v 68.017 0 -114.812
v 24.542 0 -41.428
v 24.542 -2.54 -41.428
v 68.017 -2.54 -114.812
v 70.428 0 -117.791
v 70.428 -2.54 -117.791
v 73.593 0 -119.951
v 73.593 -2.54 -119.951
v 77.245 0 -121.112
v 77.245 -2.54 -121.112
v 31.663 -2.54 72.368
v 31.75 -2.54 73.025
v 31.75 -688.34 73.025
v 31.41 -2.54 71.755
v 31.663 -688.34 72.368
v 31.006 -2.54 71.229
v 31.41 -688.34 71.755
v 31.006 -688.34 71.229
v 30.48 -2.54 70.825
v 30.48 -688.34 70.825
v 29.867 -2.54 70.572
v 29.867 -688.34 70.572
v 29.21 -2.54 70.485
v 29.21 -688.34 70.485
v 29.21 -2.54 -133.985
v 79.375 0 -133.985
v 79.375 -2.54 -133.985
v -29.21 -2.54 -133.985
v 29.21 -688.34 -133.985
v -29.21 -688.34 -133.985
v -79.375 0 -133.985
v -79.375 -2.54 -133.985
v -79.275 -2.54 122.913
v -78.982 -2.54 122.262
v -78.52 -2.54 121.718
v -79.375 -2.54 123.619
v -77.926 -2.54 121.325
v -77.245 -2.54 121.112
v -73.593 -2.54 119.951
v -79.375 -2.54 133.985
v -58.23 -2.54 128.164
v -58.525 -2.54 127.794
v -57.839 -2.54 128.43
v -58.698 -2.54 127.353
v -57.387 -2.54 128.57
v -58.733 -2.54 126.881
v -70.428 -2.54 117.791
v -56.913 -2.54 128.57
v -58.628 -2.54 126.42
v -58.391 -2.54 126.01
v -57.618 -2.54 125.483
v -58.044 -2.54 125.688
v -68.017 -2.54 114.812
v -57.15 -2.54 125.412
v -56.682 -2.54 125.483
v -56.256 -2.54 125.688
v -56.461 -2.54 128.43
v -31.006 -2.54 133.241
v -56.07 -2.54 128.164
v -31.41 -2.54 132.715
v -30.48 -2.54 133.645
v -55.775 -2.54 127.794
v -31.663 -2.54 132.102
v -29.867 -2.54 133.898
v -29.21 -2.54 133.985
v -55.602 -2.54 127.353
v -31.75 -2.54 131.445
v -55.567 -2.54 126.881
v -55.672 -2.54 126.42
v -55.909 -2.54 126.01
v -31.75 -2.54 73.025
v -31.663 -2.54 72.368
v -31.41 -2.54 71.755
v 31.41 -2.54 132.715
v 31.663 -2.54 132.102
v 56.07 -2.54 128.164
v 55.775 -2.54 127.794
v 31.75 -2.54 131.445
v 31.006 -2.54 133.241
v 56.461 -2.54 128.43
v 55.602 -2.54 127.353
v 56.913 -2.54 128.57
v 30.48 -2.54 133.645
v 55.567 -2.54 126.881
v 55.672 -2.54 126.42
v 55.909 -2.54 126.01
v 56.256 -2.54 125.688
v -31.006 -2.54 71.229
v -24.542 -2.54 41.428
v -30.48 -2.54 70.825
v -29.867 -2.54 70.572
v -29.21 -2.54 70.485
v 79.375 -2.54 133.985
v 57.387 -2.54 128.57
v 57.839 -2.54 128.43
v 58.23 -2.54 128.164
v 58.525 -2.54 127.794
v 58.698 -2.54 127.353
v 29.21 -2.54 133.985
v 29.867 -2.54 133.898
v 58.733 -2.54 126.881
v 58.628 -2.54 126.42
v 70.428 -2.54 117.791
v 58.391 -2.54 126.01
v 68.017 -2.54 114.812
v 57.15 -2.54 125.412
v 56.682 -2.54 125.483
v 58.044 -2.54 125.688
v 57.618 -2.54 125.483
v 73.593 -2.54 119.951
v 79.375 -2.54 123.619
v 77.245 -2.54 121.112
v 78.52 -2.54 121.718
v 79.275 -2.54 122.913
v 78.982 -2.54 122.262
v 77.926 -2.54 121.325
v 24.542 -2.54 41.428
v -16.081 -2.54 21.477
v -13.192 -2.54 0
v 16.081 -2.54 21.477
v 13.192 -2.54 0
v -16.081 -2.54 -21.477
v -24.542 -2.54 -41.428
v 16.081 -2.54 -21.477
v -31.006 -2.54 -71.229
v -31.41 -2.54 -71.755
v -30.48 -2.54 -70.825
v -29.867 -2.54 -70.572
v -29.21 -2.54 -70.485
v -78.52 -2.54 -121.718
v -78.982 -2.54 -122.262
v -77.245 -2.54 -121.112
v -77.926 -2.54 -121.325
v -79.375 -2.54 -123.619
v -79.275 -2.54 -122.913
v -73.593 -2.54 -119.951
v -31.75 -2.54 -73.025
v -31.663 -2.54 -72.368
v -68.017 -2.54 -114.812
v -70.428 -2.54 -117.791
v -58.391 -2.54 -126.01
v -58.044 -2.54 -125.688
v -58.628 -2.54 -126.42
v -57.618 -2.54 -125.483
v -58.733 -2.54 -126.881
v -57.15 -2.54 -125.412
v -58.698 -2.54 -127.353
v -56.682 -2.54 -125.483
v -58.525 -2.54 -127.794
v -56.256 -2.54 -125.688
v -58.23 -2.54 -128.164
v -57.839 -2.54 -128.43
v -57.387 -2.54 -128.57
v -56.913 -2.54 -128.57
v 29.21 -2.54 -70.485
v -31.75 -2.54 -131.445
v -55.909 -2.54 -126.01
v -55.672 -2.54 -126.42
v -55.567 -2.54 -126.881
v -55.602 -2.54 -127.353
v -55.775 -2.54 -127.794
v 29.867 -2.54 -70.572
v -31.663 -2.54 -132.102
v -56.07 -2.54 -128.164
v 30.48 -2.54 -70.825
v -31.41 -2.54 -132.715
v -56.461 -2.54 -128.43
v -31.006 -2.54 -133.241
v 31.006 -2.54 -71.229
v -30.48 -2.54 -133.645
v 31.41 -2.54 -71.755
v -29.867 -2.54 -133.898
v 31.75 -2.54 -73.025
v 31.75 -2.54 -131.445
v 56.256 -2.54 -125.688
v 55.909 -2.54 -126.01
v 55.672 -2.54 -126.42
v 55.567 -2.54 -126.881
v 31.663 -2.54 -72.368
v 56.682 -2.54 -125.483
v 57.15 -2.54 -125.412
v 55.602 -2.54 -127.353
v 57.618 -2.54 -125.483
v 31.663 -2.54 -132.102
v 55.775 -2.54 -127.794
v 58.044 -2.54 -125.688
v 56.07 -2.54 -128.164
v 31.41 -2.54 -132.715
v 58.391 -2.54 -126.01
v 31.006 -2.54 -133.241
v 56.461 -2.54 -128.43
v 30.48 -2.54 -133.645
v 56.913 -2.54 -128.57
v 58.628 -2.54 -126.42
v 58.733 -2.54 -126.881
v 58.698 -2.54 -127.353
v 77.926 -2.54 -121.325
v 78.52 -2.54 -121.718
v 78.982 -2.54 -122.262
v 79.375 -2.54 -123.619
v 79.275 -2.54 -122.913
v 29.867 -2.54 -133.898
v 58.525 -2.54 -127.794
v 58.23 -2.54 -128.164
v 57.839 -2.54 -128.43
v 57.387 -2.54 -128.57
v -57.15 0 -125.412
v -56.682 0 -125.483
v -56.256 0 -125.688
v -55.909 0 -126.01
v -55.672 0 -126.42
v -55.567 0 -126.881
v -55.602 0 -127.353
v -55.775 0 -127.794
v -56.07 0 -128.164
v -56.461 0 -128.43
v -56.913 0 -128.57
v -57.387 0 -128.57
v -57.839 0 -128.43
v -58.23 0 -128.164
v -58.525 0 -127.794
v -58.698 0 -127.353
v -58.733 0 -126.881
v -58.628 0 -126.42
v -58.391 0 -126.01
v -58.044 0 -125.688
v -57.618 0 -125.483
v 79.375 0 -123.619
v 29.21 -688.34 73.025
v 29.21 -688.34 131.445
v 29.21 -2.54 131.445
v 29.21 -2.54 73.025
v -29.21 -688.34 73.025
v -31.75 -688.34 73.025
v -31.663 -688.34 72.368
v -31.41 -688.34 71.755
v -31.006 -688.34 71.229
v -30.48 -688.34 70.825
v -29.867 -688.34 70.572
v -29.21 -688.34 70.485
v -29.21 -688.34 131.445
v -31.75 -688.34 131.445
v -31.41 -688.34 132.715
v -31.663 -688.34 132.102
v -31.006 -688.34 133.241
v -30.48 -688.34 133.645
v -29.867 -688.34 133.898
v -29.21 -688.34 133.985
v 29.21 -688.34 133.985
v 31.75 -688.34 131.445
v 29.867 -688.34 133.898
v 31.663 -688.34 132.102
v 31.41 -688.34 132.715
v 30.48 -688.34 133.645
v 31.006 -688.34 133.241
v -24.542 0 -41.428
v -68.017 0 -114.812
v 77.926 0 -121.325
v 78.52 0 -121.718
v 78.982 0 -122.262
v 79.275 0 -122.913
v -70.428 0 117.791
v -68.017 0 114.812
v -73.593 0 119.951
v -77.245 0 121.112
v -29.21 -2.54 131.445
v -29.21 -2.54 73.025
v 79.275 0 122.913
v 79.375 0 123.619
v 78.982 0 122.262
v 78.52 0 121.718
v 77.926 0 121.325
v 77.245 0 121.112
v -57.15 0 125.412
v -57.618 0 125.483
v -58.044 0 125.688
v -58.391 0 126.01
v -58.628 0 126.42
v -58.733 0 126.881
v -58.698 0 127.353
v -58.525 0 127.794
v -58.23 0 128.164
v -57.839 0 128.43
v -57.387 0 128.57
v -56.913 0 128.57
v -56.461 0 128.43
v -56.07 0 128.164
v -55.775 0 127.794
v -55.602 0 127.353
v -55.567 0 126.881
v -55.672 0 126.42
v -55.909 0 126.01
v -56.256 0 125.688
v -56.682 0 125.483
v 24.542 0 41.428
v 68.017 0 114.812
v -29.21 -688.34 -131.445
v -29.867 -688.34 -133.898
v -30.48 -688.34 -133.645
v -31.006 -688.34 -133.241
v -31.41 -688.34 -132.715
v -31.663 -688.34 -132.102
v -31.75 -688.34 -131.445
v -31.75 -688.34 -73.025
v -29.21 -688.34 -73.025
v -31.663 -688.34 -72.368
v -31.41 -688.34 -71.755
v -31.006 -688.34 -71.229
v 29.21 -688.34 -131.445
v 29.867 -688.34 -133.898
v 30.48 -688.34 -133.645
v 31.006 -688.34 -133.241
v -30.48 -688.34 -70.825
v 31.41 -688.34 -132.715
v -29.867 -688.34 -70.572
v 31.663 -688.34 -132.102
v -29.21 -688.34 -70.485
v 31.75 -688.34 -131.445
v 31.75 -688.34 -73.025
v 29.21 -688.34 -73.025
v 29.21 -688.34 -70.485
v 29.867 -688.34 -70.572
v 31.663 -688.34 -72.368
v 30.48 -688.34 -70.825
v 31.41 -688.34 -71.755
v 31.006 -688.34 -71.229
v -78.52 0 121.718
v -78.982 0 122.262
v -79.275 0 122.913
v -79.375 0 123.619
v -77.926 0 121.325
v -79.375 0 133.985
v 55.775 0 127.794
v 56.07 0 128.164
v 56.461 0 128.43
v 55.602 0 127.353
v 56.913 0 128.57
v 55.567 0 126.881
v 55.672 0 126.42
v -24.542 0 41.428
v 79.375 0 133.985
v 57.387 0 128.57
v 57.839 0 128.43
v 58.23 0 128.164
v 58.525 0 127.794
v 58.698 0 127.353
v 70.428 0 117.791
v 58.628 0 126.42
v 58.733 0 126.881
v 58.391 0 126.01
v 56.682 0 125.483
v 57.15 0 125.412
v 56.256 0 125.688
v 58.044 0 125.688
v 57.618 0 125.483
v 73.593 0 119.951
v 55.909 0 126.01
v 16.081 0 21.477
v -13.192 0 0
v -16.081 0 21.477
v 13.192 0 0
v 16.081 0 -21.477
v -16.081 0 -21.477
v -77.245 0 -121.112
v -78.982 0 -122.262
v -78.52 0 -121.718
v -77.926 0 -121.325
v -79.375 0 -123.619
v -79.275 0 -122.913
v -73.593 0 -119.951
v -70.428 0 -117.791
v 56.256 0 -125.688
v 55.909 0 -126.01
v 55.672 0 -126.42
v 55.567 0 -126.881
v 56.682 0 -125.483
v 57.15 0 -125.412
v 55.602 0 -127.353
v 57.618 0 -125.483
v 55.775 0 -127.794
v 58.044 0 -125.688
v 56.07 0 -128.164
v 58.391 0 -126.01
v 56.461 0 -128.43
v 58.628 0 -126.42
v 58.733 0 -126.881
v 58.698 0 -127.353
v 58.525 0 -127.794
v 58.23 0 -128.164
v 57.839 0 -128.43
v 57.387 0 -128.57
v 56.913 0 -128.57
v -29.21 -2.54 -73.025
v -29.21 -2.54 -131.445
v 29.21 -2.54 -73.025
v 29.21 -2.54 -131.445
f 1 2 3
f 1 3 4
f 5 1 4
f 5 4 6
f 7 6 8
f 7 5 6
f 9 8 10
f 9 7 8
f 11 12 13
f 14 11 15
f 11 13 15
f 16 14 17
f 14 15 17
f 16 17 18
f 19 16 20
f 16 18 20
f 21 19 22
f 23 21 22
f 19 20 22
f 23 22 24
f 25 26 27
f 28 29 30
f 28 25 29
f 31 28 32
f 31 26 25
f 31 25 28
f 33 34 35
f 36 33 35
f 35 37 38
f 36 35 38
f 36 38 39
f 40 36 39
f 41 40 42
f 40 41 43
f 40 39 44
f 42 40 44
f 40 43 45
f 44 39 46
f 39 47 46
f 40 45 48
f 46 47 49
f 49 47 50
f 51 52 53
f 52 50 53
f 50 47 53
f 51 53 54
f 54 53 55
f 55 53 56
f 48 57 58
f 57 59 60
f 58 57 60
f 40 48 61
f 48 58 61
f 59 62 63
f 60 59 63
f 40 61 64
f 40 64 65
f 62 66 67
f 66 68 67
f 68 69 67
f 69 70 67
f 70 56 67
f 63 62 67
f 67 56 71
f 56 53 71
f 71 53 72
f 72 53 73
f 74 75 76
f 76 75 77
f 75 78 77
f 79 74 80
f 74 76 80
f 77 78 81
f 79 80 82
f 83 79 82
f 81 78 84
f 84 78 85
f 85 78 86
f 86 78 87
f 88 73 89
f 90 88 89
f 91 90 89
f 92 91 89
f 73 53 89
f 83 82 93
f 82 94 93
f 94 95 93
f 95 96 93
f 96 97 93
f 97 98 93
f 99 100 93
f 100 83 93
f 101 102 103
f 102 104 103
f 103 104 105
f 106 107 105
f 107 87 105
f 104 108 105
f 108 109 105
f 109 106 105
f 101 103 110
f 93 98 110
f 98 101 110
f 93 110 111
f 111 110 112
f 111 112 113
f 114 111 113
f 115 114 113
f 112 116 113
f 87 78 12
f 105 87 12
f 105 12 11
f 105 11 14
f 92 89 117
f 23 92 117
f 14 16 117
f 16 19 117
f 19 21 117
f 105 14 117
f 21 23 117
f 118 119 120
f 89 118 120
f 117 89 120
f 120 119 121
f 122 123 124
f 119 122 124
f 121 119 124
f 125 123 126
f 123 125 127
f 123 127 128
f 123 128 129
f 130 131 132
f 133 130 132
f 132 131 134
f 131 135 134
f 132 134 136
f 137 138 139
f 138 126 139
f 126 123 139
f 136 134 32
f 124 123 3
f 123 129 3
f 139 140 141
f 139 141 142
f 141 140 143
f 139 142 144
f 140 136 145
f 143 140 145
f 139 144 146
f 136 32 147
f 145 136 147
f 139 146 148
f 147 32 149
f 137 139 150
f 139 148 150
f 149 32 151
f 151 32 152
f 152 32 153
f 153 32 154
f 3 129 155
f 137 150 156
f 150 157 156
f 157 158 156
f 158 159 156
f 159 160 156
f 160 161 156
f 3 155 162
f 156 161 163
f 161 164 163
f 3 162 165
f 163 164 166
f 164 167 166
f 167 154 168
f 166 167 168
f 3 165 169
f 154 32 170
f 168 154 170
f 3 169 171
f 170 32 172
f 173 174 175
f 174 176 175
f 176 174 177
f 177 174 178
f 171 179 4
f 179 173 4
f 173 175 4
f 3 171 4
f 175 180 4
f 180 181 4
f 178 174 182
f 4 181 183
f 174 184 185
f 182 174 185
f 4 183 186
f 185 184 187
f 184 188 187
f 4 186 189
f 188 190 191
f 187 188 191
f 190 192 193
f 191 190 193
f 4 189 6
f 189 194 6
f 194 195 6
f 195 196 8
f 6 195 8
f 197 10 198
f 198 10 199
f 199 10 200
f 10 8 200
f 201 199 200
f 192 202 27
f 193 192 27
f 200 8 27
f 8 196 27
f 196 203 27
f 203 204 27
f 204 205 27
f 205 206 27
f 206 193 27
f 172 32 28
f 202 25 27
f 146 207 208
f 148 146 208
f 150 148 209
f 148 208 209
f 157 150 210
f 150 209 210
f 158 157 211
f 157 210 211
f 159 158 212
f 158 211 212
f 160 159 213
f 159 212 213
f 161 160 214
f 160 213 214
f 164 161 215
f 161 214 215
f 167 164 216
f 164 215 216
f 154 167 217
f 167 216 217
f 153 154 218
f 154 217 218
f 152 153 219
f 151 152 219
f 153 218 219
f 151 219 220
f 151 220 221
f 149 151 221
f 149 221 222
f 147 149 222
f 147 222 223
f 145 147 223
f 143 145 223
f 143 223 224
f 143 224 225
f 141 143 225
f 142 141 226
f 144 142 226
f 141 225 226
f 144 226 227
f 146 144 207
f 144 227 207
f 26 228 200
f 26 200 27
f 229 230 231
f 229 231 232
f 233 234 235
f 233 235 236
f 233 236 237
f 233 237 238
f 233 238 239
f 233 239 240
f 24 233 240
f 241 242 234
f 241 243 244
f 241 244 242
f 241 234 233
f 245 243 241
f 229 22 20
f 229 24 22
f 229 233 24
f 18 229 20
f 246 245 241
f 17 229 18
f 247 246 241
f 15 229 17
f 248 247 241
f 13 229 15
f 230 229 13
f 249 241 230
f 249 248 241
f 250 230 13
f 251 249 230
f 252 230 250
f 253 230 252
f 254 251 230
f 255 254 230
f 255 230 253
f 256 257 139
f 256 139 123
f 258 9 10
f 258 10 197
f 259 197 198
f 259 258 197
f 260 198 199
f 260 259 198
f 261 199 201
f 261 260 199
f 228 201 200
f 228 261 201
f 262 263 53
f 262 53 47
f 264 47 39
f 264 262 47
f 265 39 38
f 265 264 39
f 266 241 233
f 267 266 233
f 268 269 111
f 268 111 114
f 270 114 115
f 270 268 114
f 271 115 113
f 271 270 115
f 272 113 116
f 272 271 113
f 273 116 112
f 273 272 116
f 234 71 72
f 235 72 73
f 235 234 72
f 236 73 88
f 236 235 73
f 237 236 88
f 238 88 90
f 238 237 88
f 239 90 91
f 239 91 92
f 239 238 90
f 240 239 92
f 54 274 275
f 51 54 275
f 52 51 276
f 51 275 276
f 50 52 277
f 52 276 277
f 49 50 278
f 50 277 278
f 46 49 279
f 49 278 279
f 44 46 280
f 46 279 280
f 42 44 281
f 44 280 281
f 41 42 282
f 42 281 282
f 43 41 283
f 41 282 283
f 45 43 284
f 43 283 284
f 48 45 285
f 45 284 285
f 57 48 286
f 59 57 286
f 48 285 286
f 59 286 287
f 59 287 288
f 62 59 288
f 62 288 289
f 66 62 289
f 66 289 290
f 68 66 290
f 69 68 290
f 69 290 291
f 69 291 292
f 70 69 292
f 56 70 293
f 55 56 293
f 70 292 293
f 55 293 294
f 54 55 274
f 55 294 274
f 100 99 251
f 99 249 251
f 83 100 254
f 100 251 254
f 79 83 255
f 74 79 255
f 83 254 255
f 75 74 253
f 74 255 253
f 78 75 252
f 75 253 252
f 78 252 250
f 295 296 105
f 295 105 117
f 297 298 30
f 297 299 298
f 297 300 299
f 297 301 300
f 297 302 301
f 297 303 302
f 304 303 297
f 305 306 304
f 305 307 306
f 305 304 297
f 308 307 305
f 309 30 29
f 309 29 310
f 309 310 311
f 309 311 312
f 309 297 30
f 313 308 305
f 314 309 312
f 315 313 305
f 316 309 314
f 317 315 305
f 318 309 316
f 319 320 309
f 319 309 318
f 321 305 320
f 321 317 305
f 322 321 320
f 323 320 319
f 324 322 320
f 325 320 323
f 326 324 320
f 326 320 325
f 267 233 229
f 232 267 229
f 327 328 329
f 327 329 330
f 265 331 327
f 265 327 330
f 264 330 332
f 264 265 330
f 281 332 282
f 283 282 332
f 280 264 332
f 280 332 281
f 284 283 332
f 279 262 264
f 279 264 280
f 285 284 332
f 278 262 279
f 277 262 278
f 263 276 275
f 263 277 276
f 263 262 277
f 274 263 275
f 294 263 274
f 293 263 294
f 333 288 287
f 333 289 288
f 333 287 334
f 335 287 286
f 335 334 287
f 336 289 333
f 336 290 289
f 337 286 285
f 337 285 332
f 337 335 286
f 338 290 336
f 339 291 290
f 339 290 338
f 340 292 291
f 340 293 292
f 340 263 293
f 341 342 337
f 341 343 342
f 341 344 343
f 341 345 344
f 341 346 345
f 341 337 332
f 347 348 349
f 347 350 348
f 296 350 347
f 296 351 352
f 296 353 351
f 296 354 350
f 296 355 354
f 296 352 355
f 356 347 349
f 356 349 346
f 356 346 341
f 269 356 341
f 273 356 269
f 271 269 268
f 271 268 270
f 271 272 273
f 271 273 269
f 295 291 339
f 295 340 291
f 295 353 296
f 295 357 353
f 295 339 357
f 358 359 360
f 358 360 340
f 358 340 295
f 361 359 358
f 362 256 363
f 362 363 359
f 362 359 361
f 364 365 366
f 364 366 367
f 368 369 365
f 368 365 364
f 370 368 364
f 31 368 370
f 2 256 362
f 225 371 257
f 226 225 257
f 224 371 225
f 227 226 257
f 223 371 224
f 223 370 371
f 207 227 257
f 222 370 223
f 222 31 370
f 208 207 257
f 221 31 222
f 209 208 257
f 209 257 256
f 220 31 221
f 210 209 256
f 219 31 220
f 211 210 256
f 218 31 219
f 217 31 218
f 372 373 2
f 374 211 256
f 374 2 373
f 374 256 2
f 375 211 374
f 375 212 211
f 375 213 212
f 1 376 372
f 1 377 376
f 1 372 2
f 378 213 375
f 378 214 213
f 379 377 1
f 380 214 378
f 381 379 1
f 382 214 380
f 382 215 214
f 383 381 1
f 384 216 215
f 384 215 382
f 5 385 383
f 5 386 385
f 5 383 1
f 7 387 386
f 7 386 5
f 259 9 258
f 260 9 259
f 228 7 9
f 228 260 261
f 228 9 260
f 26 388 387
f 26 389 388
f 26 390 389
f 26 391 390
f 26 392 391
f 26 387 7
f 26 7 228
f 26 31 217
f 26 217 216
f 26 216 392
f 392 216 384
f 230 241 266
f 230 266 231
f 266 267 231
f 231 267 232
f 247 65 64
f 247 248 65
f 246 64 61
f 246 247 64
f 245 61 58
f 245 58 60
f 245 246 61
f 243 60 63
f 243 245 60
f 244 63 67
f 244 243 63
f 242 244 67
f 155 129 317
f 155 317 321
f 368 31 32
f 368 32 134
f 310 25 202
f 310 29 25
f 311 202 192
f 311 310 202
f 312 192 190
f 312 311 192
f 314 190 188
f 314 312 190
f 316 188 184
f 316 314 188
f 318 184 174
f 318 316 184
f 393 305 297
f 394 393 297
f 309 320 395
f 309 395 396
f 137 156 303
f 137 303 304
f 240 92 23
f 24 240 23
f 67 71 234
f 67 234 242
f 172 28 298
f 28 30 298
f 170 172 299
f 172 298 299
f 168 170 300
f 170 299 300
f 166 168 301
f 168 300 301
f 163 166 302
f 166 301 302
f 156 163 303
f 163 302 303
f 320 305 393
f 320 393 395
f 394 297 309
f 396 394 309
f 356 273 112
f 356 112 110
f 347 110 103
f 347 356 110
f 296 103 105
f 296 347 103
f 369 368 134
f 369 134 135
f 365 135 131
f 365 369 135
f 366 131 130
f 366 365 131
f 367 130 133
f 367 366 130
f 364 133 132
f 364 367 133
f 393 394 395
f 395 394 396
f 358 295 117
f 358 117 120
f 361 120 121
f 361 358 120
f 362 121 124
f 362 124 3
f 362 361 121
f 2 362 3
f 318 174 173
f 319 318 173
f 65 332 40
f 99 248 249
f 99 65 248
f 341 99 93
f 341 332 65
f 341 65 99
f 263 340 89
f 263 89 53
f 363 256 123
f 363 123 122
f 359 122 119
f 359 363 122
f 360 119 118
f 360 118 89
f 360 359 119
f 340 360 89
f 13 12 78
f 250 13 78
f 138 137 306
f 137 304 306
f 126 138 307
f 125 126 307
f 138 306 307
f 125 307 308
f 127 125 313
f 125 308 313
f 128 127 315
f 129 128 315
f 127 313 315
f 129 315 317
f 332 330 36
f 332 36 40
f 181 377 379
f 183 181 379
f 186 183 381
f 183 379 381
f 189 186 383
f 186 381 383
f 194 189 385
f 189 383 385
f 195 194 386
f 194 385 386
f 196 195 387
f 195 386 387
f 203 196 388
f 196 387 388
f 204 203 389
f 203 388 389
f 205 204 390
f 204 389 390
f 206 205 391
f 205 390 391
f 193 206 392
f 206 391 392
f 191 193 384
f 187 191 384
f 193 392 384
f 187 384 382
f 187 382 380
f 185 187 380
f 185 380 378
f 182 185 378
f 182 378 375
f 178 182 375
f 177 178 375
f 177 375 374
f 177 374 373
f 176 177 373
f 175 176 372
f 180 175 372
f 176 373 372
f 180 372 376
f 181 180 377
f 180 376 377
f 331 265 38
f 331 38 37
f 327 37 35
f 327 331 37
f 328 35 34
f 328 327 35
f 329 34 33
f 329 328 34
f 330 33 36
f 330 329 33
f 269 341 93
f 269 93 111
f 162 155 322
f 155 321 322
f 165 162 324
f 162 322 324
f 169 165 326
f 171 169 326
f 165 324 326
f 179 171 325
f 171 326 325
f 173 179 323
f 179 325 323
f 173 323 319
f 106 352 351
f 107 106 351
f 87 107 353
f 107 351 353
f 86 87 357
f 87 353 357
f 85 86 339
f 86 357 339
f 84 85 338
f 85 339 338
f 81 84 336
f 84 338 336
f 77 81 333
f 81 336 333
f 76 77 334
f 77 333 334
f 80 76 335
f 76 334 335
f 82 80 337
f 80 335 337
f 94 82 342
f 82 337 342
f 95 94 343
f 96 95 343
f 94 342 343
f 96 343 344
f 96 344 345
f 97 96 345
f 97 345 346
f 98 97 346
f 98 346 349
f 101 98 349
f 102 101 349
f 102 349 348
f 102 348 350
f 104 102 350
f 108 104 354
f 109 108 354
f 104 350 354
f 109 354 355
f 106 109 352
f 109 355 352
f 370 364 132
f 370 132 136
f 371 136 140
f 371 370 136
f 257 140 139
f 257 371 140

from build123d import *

# Parameters (mm, degrees)
SKETCH1_R           = 1.5875
BOSS_EXTRUDE1_DEPTH = 2.54
SKETCH2_W           = 63.5
SKETCH2_H           = 63.5
BOSS_EXTRUDE2_DEPTH = 685.8
SHELL1_START        = -688.34
SHELL1_OUTLINE_W    = 58.42
SHELL1_OUTLINE_H    = 58.42
SHELL1_DEPTH        = 685.8
FILLET1_R           = 2.54
FILLET2_R           = 2.54


# Read off the part's stored shape, not the designer's step: Shell1
with BuildPart() as part:
    # Sketch1 → Boss-Extrude1 (new body)
    with BuildSketch(Plane(origin=(0, 0, 0), x_dir=(1, 0, 0), z_dir=(0, 1, 0))):
        with BuildLine():
            Line((-79.375, -133.985), (79.375, -133.985))
            Line((79.375, -133.985), (79.375, -123.618732018))
            ThreePointArc((79.375, -123.618732018), (78.770533054, -121.973948811), (77.244833229, -121.1120137))
            ThreePointArc((77.244833229, -121.1120137), (71.931312021, -118.98641106), (68.016545719, -114.811929173))
            Line((68.016545719, -114.811929173), (24.542448632, -41.427653291))
            ThreePointArc((24.542448632, -41.427653291), (13.192327388, 0), (24.542448632, 41.427653291))
            Line((24.542448632, 41.427653291), (68.016545719, 114.811929173))
            ThreePointArc((68.016545719, 114.811929173), (71.931312021, 118.98641106), (77.244833229, 121.1120137))
            ThreePointArc((77.244833229, 121.1120137), (78.770533054, 121.973948811), (79.375, 123.618732018))
            Line((79.375, 123.618732018), (79.375, 133.985))
            Line((79.375, 133.985), (-79.375, 133.985))
            Line((-79.375, 133.985), (-79.375, 123.618732018))
            ThreePointArc((-79.375, 123.618732018), (-78.770533054, 121.973948811), (-77.244833229, 121.1120137))
            ThreePointArc((-77.244833229, 121.1120137), (-71.931312021, 118.98641106), (-68.016545719, 114.811929173))
            Line((-68.016545719, 114.811929173), (-24.542448632, 41.427653291))
            ThreePointArc((-24.542448632, 41.427653291), (-13.192327388, 0), (-24.542448632, -41.427653291))
            Line((-24.542448632, -41.427653291), (-68.016545719, -114.811929173))
            ThreePointArc((-68.016545719, -114.811929173), (-71.931312021, -118.98641106), (-77.244833229, -121.1120137))
            ThreePointArc((-77.244833229, -121.1120137), (-78.770533054, -121.973948811), (-79.375, -123.618732018))
            Line((-79.375, -123.618732018), (-79.375, -133.985))
        make_face()
        with Locations(Location((-57.15, 127, 0), (0, 0, 270))):
            Circle(SKETCH1_R, mode=Mode.SUBTRACT)
        with Locations(Location((57.15, 127, 0), (0, 0, 270))):
            Circle(SKETCH1_R, mode=Mode.SUBTRACT)
        with Locations(Location((57.15, -127, 0), (0, 0, 90))):
            Circle(SKETCH1_R, mode=Mode.SUBTRACT)
        with Locations(Location((-57.15, -127, 0), (0, 0, 90))):
            Circle(SKETCH1_R, mode=Mode.SUBTRACT)
    extrude(amount=-BOSS_EXTRUDE1_DEPTH)

    # Sketch2 → Boss-Extrude2 (add)
    with BuildSketch(Plane.XZ.offset(2.54)):
        with Locations((0, -102.235)):
            Rectangle(SKETCH2_W, SKETCH2_H)
        with Locations((0, 102.235)):
            Rectangle(SKETCH2_W, SKETCH2_H)
    extrude(amount=BOSS_EXTRUDE2_DEPTH)

    # Shell1 outline → Shell1 (cut)
    with BuildSketch(Plane(origin=(0, 0, 0), x_dir=(1, 0, 0), z_dir=(0, 1, 0)).offset(SHELL1_START)):
        with Locations((0, 102.235)):
            Rectangle(SHELL1_OUTLINE_W, SHELL1_OUTLINE_H)
        with Locations((0, -102.235)):
            Rectangle(SHELL1_OUTLINE_W, SHELL1_OUTLINE_H)
    extrude(amount=SHELL1_DEPTH, mode=Mode.SUBTRACT)

    # Fillet1
    fillet1_edges = [part.edges().sort_by_distance(p)[0] for p in [
        (31.75, -345.44, 70.485),
        (31.75, -345.44, 133.985),
        (-31.75, -345.44, 133.985),
        (-31.75, -345.44, 70.485),
    ]]
    fillet(fillet1_edges, radius=FILLET1_R)

    # Fillet2
    fillet2_edges = [part.edges().sort_by_distance(p)[0] for p in [
        (-31.75, -345.44, -70.485),
        (-31.75, -345.44, -133.985),
        (31.75, -345.44, -133.985),
        (31.75, -345.44, -70.485),
    ]]
    fillet(fillet2_edges, radius=FILLET2_R)


solid = part.part
